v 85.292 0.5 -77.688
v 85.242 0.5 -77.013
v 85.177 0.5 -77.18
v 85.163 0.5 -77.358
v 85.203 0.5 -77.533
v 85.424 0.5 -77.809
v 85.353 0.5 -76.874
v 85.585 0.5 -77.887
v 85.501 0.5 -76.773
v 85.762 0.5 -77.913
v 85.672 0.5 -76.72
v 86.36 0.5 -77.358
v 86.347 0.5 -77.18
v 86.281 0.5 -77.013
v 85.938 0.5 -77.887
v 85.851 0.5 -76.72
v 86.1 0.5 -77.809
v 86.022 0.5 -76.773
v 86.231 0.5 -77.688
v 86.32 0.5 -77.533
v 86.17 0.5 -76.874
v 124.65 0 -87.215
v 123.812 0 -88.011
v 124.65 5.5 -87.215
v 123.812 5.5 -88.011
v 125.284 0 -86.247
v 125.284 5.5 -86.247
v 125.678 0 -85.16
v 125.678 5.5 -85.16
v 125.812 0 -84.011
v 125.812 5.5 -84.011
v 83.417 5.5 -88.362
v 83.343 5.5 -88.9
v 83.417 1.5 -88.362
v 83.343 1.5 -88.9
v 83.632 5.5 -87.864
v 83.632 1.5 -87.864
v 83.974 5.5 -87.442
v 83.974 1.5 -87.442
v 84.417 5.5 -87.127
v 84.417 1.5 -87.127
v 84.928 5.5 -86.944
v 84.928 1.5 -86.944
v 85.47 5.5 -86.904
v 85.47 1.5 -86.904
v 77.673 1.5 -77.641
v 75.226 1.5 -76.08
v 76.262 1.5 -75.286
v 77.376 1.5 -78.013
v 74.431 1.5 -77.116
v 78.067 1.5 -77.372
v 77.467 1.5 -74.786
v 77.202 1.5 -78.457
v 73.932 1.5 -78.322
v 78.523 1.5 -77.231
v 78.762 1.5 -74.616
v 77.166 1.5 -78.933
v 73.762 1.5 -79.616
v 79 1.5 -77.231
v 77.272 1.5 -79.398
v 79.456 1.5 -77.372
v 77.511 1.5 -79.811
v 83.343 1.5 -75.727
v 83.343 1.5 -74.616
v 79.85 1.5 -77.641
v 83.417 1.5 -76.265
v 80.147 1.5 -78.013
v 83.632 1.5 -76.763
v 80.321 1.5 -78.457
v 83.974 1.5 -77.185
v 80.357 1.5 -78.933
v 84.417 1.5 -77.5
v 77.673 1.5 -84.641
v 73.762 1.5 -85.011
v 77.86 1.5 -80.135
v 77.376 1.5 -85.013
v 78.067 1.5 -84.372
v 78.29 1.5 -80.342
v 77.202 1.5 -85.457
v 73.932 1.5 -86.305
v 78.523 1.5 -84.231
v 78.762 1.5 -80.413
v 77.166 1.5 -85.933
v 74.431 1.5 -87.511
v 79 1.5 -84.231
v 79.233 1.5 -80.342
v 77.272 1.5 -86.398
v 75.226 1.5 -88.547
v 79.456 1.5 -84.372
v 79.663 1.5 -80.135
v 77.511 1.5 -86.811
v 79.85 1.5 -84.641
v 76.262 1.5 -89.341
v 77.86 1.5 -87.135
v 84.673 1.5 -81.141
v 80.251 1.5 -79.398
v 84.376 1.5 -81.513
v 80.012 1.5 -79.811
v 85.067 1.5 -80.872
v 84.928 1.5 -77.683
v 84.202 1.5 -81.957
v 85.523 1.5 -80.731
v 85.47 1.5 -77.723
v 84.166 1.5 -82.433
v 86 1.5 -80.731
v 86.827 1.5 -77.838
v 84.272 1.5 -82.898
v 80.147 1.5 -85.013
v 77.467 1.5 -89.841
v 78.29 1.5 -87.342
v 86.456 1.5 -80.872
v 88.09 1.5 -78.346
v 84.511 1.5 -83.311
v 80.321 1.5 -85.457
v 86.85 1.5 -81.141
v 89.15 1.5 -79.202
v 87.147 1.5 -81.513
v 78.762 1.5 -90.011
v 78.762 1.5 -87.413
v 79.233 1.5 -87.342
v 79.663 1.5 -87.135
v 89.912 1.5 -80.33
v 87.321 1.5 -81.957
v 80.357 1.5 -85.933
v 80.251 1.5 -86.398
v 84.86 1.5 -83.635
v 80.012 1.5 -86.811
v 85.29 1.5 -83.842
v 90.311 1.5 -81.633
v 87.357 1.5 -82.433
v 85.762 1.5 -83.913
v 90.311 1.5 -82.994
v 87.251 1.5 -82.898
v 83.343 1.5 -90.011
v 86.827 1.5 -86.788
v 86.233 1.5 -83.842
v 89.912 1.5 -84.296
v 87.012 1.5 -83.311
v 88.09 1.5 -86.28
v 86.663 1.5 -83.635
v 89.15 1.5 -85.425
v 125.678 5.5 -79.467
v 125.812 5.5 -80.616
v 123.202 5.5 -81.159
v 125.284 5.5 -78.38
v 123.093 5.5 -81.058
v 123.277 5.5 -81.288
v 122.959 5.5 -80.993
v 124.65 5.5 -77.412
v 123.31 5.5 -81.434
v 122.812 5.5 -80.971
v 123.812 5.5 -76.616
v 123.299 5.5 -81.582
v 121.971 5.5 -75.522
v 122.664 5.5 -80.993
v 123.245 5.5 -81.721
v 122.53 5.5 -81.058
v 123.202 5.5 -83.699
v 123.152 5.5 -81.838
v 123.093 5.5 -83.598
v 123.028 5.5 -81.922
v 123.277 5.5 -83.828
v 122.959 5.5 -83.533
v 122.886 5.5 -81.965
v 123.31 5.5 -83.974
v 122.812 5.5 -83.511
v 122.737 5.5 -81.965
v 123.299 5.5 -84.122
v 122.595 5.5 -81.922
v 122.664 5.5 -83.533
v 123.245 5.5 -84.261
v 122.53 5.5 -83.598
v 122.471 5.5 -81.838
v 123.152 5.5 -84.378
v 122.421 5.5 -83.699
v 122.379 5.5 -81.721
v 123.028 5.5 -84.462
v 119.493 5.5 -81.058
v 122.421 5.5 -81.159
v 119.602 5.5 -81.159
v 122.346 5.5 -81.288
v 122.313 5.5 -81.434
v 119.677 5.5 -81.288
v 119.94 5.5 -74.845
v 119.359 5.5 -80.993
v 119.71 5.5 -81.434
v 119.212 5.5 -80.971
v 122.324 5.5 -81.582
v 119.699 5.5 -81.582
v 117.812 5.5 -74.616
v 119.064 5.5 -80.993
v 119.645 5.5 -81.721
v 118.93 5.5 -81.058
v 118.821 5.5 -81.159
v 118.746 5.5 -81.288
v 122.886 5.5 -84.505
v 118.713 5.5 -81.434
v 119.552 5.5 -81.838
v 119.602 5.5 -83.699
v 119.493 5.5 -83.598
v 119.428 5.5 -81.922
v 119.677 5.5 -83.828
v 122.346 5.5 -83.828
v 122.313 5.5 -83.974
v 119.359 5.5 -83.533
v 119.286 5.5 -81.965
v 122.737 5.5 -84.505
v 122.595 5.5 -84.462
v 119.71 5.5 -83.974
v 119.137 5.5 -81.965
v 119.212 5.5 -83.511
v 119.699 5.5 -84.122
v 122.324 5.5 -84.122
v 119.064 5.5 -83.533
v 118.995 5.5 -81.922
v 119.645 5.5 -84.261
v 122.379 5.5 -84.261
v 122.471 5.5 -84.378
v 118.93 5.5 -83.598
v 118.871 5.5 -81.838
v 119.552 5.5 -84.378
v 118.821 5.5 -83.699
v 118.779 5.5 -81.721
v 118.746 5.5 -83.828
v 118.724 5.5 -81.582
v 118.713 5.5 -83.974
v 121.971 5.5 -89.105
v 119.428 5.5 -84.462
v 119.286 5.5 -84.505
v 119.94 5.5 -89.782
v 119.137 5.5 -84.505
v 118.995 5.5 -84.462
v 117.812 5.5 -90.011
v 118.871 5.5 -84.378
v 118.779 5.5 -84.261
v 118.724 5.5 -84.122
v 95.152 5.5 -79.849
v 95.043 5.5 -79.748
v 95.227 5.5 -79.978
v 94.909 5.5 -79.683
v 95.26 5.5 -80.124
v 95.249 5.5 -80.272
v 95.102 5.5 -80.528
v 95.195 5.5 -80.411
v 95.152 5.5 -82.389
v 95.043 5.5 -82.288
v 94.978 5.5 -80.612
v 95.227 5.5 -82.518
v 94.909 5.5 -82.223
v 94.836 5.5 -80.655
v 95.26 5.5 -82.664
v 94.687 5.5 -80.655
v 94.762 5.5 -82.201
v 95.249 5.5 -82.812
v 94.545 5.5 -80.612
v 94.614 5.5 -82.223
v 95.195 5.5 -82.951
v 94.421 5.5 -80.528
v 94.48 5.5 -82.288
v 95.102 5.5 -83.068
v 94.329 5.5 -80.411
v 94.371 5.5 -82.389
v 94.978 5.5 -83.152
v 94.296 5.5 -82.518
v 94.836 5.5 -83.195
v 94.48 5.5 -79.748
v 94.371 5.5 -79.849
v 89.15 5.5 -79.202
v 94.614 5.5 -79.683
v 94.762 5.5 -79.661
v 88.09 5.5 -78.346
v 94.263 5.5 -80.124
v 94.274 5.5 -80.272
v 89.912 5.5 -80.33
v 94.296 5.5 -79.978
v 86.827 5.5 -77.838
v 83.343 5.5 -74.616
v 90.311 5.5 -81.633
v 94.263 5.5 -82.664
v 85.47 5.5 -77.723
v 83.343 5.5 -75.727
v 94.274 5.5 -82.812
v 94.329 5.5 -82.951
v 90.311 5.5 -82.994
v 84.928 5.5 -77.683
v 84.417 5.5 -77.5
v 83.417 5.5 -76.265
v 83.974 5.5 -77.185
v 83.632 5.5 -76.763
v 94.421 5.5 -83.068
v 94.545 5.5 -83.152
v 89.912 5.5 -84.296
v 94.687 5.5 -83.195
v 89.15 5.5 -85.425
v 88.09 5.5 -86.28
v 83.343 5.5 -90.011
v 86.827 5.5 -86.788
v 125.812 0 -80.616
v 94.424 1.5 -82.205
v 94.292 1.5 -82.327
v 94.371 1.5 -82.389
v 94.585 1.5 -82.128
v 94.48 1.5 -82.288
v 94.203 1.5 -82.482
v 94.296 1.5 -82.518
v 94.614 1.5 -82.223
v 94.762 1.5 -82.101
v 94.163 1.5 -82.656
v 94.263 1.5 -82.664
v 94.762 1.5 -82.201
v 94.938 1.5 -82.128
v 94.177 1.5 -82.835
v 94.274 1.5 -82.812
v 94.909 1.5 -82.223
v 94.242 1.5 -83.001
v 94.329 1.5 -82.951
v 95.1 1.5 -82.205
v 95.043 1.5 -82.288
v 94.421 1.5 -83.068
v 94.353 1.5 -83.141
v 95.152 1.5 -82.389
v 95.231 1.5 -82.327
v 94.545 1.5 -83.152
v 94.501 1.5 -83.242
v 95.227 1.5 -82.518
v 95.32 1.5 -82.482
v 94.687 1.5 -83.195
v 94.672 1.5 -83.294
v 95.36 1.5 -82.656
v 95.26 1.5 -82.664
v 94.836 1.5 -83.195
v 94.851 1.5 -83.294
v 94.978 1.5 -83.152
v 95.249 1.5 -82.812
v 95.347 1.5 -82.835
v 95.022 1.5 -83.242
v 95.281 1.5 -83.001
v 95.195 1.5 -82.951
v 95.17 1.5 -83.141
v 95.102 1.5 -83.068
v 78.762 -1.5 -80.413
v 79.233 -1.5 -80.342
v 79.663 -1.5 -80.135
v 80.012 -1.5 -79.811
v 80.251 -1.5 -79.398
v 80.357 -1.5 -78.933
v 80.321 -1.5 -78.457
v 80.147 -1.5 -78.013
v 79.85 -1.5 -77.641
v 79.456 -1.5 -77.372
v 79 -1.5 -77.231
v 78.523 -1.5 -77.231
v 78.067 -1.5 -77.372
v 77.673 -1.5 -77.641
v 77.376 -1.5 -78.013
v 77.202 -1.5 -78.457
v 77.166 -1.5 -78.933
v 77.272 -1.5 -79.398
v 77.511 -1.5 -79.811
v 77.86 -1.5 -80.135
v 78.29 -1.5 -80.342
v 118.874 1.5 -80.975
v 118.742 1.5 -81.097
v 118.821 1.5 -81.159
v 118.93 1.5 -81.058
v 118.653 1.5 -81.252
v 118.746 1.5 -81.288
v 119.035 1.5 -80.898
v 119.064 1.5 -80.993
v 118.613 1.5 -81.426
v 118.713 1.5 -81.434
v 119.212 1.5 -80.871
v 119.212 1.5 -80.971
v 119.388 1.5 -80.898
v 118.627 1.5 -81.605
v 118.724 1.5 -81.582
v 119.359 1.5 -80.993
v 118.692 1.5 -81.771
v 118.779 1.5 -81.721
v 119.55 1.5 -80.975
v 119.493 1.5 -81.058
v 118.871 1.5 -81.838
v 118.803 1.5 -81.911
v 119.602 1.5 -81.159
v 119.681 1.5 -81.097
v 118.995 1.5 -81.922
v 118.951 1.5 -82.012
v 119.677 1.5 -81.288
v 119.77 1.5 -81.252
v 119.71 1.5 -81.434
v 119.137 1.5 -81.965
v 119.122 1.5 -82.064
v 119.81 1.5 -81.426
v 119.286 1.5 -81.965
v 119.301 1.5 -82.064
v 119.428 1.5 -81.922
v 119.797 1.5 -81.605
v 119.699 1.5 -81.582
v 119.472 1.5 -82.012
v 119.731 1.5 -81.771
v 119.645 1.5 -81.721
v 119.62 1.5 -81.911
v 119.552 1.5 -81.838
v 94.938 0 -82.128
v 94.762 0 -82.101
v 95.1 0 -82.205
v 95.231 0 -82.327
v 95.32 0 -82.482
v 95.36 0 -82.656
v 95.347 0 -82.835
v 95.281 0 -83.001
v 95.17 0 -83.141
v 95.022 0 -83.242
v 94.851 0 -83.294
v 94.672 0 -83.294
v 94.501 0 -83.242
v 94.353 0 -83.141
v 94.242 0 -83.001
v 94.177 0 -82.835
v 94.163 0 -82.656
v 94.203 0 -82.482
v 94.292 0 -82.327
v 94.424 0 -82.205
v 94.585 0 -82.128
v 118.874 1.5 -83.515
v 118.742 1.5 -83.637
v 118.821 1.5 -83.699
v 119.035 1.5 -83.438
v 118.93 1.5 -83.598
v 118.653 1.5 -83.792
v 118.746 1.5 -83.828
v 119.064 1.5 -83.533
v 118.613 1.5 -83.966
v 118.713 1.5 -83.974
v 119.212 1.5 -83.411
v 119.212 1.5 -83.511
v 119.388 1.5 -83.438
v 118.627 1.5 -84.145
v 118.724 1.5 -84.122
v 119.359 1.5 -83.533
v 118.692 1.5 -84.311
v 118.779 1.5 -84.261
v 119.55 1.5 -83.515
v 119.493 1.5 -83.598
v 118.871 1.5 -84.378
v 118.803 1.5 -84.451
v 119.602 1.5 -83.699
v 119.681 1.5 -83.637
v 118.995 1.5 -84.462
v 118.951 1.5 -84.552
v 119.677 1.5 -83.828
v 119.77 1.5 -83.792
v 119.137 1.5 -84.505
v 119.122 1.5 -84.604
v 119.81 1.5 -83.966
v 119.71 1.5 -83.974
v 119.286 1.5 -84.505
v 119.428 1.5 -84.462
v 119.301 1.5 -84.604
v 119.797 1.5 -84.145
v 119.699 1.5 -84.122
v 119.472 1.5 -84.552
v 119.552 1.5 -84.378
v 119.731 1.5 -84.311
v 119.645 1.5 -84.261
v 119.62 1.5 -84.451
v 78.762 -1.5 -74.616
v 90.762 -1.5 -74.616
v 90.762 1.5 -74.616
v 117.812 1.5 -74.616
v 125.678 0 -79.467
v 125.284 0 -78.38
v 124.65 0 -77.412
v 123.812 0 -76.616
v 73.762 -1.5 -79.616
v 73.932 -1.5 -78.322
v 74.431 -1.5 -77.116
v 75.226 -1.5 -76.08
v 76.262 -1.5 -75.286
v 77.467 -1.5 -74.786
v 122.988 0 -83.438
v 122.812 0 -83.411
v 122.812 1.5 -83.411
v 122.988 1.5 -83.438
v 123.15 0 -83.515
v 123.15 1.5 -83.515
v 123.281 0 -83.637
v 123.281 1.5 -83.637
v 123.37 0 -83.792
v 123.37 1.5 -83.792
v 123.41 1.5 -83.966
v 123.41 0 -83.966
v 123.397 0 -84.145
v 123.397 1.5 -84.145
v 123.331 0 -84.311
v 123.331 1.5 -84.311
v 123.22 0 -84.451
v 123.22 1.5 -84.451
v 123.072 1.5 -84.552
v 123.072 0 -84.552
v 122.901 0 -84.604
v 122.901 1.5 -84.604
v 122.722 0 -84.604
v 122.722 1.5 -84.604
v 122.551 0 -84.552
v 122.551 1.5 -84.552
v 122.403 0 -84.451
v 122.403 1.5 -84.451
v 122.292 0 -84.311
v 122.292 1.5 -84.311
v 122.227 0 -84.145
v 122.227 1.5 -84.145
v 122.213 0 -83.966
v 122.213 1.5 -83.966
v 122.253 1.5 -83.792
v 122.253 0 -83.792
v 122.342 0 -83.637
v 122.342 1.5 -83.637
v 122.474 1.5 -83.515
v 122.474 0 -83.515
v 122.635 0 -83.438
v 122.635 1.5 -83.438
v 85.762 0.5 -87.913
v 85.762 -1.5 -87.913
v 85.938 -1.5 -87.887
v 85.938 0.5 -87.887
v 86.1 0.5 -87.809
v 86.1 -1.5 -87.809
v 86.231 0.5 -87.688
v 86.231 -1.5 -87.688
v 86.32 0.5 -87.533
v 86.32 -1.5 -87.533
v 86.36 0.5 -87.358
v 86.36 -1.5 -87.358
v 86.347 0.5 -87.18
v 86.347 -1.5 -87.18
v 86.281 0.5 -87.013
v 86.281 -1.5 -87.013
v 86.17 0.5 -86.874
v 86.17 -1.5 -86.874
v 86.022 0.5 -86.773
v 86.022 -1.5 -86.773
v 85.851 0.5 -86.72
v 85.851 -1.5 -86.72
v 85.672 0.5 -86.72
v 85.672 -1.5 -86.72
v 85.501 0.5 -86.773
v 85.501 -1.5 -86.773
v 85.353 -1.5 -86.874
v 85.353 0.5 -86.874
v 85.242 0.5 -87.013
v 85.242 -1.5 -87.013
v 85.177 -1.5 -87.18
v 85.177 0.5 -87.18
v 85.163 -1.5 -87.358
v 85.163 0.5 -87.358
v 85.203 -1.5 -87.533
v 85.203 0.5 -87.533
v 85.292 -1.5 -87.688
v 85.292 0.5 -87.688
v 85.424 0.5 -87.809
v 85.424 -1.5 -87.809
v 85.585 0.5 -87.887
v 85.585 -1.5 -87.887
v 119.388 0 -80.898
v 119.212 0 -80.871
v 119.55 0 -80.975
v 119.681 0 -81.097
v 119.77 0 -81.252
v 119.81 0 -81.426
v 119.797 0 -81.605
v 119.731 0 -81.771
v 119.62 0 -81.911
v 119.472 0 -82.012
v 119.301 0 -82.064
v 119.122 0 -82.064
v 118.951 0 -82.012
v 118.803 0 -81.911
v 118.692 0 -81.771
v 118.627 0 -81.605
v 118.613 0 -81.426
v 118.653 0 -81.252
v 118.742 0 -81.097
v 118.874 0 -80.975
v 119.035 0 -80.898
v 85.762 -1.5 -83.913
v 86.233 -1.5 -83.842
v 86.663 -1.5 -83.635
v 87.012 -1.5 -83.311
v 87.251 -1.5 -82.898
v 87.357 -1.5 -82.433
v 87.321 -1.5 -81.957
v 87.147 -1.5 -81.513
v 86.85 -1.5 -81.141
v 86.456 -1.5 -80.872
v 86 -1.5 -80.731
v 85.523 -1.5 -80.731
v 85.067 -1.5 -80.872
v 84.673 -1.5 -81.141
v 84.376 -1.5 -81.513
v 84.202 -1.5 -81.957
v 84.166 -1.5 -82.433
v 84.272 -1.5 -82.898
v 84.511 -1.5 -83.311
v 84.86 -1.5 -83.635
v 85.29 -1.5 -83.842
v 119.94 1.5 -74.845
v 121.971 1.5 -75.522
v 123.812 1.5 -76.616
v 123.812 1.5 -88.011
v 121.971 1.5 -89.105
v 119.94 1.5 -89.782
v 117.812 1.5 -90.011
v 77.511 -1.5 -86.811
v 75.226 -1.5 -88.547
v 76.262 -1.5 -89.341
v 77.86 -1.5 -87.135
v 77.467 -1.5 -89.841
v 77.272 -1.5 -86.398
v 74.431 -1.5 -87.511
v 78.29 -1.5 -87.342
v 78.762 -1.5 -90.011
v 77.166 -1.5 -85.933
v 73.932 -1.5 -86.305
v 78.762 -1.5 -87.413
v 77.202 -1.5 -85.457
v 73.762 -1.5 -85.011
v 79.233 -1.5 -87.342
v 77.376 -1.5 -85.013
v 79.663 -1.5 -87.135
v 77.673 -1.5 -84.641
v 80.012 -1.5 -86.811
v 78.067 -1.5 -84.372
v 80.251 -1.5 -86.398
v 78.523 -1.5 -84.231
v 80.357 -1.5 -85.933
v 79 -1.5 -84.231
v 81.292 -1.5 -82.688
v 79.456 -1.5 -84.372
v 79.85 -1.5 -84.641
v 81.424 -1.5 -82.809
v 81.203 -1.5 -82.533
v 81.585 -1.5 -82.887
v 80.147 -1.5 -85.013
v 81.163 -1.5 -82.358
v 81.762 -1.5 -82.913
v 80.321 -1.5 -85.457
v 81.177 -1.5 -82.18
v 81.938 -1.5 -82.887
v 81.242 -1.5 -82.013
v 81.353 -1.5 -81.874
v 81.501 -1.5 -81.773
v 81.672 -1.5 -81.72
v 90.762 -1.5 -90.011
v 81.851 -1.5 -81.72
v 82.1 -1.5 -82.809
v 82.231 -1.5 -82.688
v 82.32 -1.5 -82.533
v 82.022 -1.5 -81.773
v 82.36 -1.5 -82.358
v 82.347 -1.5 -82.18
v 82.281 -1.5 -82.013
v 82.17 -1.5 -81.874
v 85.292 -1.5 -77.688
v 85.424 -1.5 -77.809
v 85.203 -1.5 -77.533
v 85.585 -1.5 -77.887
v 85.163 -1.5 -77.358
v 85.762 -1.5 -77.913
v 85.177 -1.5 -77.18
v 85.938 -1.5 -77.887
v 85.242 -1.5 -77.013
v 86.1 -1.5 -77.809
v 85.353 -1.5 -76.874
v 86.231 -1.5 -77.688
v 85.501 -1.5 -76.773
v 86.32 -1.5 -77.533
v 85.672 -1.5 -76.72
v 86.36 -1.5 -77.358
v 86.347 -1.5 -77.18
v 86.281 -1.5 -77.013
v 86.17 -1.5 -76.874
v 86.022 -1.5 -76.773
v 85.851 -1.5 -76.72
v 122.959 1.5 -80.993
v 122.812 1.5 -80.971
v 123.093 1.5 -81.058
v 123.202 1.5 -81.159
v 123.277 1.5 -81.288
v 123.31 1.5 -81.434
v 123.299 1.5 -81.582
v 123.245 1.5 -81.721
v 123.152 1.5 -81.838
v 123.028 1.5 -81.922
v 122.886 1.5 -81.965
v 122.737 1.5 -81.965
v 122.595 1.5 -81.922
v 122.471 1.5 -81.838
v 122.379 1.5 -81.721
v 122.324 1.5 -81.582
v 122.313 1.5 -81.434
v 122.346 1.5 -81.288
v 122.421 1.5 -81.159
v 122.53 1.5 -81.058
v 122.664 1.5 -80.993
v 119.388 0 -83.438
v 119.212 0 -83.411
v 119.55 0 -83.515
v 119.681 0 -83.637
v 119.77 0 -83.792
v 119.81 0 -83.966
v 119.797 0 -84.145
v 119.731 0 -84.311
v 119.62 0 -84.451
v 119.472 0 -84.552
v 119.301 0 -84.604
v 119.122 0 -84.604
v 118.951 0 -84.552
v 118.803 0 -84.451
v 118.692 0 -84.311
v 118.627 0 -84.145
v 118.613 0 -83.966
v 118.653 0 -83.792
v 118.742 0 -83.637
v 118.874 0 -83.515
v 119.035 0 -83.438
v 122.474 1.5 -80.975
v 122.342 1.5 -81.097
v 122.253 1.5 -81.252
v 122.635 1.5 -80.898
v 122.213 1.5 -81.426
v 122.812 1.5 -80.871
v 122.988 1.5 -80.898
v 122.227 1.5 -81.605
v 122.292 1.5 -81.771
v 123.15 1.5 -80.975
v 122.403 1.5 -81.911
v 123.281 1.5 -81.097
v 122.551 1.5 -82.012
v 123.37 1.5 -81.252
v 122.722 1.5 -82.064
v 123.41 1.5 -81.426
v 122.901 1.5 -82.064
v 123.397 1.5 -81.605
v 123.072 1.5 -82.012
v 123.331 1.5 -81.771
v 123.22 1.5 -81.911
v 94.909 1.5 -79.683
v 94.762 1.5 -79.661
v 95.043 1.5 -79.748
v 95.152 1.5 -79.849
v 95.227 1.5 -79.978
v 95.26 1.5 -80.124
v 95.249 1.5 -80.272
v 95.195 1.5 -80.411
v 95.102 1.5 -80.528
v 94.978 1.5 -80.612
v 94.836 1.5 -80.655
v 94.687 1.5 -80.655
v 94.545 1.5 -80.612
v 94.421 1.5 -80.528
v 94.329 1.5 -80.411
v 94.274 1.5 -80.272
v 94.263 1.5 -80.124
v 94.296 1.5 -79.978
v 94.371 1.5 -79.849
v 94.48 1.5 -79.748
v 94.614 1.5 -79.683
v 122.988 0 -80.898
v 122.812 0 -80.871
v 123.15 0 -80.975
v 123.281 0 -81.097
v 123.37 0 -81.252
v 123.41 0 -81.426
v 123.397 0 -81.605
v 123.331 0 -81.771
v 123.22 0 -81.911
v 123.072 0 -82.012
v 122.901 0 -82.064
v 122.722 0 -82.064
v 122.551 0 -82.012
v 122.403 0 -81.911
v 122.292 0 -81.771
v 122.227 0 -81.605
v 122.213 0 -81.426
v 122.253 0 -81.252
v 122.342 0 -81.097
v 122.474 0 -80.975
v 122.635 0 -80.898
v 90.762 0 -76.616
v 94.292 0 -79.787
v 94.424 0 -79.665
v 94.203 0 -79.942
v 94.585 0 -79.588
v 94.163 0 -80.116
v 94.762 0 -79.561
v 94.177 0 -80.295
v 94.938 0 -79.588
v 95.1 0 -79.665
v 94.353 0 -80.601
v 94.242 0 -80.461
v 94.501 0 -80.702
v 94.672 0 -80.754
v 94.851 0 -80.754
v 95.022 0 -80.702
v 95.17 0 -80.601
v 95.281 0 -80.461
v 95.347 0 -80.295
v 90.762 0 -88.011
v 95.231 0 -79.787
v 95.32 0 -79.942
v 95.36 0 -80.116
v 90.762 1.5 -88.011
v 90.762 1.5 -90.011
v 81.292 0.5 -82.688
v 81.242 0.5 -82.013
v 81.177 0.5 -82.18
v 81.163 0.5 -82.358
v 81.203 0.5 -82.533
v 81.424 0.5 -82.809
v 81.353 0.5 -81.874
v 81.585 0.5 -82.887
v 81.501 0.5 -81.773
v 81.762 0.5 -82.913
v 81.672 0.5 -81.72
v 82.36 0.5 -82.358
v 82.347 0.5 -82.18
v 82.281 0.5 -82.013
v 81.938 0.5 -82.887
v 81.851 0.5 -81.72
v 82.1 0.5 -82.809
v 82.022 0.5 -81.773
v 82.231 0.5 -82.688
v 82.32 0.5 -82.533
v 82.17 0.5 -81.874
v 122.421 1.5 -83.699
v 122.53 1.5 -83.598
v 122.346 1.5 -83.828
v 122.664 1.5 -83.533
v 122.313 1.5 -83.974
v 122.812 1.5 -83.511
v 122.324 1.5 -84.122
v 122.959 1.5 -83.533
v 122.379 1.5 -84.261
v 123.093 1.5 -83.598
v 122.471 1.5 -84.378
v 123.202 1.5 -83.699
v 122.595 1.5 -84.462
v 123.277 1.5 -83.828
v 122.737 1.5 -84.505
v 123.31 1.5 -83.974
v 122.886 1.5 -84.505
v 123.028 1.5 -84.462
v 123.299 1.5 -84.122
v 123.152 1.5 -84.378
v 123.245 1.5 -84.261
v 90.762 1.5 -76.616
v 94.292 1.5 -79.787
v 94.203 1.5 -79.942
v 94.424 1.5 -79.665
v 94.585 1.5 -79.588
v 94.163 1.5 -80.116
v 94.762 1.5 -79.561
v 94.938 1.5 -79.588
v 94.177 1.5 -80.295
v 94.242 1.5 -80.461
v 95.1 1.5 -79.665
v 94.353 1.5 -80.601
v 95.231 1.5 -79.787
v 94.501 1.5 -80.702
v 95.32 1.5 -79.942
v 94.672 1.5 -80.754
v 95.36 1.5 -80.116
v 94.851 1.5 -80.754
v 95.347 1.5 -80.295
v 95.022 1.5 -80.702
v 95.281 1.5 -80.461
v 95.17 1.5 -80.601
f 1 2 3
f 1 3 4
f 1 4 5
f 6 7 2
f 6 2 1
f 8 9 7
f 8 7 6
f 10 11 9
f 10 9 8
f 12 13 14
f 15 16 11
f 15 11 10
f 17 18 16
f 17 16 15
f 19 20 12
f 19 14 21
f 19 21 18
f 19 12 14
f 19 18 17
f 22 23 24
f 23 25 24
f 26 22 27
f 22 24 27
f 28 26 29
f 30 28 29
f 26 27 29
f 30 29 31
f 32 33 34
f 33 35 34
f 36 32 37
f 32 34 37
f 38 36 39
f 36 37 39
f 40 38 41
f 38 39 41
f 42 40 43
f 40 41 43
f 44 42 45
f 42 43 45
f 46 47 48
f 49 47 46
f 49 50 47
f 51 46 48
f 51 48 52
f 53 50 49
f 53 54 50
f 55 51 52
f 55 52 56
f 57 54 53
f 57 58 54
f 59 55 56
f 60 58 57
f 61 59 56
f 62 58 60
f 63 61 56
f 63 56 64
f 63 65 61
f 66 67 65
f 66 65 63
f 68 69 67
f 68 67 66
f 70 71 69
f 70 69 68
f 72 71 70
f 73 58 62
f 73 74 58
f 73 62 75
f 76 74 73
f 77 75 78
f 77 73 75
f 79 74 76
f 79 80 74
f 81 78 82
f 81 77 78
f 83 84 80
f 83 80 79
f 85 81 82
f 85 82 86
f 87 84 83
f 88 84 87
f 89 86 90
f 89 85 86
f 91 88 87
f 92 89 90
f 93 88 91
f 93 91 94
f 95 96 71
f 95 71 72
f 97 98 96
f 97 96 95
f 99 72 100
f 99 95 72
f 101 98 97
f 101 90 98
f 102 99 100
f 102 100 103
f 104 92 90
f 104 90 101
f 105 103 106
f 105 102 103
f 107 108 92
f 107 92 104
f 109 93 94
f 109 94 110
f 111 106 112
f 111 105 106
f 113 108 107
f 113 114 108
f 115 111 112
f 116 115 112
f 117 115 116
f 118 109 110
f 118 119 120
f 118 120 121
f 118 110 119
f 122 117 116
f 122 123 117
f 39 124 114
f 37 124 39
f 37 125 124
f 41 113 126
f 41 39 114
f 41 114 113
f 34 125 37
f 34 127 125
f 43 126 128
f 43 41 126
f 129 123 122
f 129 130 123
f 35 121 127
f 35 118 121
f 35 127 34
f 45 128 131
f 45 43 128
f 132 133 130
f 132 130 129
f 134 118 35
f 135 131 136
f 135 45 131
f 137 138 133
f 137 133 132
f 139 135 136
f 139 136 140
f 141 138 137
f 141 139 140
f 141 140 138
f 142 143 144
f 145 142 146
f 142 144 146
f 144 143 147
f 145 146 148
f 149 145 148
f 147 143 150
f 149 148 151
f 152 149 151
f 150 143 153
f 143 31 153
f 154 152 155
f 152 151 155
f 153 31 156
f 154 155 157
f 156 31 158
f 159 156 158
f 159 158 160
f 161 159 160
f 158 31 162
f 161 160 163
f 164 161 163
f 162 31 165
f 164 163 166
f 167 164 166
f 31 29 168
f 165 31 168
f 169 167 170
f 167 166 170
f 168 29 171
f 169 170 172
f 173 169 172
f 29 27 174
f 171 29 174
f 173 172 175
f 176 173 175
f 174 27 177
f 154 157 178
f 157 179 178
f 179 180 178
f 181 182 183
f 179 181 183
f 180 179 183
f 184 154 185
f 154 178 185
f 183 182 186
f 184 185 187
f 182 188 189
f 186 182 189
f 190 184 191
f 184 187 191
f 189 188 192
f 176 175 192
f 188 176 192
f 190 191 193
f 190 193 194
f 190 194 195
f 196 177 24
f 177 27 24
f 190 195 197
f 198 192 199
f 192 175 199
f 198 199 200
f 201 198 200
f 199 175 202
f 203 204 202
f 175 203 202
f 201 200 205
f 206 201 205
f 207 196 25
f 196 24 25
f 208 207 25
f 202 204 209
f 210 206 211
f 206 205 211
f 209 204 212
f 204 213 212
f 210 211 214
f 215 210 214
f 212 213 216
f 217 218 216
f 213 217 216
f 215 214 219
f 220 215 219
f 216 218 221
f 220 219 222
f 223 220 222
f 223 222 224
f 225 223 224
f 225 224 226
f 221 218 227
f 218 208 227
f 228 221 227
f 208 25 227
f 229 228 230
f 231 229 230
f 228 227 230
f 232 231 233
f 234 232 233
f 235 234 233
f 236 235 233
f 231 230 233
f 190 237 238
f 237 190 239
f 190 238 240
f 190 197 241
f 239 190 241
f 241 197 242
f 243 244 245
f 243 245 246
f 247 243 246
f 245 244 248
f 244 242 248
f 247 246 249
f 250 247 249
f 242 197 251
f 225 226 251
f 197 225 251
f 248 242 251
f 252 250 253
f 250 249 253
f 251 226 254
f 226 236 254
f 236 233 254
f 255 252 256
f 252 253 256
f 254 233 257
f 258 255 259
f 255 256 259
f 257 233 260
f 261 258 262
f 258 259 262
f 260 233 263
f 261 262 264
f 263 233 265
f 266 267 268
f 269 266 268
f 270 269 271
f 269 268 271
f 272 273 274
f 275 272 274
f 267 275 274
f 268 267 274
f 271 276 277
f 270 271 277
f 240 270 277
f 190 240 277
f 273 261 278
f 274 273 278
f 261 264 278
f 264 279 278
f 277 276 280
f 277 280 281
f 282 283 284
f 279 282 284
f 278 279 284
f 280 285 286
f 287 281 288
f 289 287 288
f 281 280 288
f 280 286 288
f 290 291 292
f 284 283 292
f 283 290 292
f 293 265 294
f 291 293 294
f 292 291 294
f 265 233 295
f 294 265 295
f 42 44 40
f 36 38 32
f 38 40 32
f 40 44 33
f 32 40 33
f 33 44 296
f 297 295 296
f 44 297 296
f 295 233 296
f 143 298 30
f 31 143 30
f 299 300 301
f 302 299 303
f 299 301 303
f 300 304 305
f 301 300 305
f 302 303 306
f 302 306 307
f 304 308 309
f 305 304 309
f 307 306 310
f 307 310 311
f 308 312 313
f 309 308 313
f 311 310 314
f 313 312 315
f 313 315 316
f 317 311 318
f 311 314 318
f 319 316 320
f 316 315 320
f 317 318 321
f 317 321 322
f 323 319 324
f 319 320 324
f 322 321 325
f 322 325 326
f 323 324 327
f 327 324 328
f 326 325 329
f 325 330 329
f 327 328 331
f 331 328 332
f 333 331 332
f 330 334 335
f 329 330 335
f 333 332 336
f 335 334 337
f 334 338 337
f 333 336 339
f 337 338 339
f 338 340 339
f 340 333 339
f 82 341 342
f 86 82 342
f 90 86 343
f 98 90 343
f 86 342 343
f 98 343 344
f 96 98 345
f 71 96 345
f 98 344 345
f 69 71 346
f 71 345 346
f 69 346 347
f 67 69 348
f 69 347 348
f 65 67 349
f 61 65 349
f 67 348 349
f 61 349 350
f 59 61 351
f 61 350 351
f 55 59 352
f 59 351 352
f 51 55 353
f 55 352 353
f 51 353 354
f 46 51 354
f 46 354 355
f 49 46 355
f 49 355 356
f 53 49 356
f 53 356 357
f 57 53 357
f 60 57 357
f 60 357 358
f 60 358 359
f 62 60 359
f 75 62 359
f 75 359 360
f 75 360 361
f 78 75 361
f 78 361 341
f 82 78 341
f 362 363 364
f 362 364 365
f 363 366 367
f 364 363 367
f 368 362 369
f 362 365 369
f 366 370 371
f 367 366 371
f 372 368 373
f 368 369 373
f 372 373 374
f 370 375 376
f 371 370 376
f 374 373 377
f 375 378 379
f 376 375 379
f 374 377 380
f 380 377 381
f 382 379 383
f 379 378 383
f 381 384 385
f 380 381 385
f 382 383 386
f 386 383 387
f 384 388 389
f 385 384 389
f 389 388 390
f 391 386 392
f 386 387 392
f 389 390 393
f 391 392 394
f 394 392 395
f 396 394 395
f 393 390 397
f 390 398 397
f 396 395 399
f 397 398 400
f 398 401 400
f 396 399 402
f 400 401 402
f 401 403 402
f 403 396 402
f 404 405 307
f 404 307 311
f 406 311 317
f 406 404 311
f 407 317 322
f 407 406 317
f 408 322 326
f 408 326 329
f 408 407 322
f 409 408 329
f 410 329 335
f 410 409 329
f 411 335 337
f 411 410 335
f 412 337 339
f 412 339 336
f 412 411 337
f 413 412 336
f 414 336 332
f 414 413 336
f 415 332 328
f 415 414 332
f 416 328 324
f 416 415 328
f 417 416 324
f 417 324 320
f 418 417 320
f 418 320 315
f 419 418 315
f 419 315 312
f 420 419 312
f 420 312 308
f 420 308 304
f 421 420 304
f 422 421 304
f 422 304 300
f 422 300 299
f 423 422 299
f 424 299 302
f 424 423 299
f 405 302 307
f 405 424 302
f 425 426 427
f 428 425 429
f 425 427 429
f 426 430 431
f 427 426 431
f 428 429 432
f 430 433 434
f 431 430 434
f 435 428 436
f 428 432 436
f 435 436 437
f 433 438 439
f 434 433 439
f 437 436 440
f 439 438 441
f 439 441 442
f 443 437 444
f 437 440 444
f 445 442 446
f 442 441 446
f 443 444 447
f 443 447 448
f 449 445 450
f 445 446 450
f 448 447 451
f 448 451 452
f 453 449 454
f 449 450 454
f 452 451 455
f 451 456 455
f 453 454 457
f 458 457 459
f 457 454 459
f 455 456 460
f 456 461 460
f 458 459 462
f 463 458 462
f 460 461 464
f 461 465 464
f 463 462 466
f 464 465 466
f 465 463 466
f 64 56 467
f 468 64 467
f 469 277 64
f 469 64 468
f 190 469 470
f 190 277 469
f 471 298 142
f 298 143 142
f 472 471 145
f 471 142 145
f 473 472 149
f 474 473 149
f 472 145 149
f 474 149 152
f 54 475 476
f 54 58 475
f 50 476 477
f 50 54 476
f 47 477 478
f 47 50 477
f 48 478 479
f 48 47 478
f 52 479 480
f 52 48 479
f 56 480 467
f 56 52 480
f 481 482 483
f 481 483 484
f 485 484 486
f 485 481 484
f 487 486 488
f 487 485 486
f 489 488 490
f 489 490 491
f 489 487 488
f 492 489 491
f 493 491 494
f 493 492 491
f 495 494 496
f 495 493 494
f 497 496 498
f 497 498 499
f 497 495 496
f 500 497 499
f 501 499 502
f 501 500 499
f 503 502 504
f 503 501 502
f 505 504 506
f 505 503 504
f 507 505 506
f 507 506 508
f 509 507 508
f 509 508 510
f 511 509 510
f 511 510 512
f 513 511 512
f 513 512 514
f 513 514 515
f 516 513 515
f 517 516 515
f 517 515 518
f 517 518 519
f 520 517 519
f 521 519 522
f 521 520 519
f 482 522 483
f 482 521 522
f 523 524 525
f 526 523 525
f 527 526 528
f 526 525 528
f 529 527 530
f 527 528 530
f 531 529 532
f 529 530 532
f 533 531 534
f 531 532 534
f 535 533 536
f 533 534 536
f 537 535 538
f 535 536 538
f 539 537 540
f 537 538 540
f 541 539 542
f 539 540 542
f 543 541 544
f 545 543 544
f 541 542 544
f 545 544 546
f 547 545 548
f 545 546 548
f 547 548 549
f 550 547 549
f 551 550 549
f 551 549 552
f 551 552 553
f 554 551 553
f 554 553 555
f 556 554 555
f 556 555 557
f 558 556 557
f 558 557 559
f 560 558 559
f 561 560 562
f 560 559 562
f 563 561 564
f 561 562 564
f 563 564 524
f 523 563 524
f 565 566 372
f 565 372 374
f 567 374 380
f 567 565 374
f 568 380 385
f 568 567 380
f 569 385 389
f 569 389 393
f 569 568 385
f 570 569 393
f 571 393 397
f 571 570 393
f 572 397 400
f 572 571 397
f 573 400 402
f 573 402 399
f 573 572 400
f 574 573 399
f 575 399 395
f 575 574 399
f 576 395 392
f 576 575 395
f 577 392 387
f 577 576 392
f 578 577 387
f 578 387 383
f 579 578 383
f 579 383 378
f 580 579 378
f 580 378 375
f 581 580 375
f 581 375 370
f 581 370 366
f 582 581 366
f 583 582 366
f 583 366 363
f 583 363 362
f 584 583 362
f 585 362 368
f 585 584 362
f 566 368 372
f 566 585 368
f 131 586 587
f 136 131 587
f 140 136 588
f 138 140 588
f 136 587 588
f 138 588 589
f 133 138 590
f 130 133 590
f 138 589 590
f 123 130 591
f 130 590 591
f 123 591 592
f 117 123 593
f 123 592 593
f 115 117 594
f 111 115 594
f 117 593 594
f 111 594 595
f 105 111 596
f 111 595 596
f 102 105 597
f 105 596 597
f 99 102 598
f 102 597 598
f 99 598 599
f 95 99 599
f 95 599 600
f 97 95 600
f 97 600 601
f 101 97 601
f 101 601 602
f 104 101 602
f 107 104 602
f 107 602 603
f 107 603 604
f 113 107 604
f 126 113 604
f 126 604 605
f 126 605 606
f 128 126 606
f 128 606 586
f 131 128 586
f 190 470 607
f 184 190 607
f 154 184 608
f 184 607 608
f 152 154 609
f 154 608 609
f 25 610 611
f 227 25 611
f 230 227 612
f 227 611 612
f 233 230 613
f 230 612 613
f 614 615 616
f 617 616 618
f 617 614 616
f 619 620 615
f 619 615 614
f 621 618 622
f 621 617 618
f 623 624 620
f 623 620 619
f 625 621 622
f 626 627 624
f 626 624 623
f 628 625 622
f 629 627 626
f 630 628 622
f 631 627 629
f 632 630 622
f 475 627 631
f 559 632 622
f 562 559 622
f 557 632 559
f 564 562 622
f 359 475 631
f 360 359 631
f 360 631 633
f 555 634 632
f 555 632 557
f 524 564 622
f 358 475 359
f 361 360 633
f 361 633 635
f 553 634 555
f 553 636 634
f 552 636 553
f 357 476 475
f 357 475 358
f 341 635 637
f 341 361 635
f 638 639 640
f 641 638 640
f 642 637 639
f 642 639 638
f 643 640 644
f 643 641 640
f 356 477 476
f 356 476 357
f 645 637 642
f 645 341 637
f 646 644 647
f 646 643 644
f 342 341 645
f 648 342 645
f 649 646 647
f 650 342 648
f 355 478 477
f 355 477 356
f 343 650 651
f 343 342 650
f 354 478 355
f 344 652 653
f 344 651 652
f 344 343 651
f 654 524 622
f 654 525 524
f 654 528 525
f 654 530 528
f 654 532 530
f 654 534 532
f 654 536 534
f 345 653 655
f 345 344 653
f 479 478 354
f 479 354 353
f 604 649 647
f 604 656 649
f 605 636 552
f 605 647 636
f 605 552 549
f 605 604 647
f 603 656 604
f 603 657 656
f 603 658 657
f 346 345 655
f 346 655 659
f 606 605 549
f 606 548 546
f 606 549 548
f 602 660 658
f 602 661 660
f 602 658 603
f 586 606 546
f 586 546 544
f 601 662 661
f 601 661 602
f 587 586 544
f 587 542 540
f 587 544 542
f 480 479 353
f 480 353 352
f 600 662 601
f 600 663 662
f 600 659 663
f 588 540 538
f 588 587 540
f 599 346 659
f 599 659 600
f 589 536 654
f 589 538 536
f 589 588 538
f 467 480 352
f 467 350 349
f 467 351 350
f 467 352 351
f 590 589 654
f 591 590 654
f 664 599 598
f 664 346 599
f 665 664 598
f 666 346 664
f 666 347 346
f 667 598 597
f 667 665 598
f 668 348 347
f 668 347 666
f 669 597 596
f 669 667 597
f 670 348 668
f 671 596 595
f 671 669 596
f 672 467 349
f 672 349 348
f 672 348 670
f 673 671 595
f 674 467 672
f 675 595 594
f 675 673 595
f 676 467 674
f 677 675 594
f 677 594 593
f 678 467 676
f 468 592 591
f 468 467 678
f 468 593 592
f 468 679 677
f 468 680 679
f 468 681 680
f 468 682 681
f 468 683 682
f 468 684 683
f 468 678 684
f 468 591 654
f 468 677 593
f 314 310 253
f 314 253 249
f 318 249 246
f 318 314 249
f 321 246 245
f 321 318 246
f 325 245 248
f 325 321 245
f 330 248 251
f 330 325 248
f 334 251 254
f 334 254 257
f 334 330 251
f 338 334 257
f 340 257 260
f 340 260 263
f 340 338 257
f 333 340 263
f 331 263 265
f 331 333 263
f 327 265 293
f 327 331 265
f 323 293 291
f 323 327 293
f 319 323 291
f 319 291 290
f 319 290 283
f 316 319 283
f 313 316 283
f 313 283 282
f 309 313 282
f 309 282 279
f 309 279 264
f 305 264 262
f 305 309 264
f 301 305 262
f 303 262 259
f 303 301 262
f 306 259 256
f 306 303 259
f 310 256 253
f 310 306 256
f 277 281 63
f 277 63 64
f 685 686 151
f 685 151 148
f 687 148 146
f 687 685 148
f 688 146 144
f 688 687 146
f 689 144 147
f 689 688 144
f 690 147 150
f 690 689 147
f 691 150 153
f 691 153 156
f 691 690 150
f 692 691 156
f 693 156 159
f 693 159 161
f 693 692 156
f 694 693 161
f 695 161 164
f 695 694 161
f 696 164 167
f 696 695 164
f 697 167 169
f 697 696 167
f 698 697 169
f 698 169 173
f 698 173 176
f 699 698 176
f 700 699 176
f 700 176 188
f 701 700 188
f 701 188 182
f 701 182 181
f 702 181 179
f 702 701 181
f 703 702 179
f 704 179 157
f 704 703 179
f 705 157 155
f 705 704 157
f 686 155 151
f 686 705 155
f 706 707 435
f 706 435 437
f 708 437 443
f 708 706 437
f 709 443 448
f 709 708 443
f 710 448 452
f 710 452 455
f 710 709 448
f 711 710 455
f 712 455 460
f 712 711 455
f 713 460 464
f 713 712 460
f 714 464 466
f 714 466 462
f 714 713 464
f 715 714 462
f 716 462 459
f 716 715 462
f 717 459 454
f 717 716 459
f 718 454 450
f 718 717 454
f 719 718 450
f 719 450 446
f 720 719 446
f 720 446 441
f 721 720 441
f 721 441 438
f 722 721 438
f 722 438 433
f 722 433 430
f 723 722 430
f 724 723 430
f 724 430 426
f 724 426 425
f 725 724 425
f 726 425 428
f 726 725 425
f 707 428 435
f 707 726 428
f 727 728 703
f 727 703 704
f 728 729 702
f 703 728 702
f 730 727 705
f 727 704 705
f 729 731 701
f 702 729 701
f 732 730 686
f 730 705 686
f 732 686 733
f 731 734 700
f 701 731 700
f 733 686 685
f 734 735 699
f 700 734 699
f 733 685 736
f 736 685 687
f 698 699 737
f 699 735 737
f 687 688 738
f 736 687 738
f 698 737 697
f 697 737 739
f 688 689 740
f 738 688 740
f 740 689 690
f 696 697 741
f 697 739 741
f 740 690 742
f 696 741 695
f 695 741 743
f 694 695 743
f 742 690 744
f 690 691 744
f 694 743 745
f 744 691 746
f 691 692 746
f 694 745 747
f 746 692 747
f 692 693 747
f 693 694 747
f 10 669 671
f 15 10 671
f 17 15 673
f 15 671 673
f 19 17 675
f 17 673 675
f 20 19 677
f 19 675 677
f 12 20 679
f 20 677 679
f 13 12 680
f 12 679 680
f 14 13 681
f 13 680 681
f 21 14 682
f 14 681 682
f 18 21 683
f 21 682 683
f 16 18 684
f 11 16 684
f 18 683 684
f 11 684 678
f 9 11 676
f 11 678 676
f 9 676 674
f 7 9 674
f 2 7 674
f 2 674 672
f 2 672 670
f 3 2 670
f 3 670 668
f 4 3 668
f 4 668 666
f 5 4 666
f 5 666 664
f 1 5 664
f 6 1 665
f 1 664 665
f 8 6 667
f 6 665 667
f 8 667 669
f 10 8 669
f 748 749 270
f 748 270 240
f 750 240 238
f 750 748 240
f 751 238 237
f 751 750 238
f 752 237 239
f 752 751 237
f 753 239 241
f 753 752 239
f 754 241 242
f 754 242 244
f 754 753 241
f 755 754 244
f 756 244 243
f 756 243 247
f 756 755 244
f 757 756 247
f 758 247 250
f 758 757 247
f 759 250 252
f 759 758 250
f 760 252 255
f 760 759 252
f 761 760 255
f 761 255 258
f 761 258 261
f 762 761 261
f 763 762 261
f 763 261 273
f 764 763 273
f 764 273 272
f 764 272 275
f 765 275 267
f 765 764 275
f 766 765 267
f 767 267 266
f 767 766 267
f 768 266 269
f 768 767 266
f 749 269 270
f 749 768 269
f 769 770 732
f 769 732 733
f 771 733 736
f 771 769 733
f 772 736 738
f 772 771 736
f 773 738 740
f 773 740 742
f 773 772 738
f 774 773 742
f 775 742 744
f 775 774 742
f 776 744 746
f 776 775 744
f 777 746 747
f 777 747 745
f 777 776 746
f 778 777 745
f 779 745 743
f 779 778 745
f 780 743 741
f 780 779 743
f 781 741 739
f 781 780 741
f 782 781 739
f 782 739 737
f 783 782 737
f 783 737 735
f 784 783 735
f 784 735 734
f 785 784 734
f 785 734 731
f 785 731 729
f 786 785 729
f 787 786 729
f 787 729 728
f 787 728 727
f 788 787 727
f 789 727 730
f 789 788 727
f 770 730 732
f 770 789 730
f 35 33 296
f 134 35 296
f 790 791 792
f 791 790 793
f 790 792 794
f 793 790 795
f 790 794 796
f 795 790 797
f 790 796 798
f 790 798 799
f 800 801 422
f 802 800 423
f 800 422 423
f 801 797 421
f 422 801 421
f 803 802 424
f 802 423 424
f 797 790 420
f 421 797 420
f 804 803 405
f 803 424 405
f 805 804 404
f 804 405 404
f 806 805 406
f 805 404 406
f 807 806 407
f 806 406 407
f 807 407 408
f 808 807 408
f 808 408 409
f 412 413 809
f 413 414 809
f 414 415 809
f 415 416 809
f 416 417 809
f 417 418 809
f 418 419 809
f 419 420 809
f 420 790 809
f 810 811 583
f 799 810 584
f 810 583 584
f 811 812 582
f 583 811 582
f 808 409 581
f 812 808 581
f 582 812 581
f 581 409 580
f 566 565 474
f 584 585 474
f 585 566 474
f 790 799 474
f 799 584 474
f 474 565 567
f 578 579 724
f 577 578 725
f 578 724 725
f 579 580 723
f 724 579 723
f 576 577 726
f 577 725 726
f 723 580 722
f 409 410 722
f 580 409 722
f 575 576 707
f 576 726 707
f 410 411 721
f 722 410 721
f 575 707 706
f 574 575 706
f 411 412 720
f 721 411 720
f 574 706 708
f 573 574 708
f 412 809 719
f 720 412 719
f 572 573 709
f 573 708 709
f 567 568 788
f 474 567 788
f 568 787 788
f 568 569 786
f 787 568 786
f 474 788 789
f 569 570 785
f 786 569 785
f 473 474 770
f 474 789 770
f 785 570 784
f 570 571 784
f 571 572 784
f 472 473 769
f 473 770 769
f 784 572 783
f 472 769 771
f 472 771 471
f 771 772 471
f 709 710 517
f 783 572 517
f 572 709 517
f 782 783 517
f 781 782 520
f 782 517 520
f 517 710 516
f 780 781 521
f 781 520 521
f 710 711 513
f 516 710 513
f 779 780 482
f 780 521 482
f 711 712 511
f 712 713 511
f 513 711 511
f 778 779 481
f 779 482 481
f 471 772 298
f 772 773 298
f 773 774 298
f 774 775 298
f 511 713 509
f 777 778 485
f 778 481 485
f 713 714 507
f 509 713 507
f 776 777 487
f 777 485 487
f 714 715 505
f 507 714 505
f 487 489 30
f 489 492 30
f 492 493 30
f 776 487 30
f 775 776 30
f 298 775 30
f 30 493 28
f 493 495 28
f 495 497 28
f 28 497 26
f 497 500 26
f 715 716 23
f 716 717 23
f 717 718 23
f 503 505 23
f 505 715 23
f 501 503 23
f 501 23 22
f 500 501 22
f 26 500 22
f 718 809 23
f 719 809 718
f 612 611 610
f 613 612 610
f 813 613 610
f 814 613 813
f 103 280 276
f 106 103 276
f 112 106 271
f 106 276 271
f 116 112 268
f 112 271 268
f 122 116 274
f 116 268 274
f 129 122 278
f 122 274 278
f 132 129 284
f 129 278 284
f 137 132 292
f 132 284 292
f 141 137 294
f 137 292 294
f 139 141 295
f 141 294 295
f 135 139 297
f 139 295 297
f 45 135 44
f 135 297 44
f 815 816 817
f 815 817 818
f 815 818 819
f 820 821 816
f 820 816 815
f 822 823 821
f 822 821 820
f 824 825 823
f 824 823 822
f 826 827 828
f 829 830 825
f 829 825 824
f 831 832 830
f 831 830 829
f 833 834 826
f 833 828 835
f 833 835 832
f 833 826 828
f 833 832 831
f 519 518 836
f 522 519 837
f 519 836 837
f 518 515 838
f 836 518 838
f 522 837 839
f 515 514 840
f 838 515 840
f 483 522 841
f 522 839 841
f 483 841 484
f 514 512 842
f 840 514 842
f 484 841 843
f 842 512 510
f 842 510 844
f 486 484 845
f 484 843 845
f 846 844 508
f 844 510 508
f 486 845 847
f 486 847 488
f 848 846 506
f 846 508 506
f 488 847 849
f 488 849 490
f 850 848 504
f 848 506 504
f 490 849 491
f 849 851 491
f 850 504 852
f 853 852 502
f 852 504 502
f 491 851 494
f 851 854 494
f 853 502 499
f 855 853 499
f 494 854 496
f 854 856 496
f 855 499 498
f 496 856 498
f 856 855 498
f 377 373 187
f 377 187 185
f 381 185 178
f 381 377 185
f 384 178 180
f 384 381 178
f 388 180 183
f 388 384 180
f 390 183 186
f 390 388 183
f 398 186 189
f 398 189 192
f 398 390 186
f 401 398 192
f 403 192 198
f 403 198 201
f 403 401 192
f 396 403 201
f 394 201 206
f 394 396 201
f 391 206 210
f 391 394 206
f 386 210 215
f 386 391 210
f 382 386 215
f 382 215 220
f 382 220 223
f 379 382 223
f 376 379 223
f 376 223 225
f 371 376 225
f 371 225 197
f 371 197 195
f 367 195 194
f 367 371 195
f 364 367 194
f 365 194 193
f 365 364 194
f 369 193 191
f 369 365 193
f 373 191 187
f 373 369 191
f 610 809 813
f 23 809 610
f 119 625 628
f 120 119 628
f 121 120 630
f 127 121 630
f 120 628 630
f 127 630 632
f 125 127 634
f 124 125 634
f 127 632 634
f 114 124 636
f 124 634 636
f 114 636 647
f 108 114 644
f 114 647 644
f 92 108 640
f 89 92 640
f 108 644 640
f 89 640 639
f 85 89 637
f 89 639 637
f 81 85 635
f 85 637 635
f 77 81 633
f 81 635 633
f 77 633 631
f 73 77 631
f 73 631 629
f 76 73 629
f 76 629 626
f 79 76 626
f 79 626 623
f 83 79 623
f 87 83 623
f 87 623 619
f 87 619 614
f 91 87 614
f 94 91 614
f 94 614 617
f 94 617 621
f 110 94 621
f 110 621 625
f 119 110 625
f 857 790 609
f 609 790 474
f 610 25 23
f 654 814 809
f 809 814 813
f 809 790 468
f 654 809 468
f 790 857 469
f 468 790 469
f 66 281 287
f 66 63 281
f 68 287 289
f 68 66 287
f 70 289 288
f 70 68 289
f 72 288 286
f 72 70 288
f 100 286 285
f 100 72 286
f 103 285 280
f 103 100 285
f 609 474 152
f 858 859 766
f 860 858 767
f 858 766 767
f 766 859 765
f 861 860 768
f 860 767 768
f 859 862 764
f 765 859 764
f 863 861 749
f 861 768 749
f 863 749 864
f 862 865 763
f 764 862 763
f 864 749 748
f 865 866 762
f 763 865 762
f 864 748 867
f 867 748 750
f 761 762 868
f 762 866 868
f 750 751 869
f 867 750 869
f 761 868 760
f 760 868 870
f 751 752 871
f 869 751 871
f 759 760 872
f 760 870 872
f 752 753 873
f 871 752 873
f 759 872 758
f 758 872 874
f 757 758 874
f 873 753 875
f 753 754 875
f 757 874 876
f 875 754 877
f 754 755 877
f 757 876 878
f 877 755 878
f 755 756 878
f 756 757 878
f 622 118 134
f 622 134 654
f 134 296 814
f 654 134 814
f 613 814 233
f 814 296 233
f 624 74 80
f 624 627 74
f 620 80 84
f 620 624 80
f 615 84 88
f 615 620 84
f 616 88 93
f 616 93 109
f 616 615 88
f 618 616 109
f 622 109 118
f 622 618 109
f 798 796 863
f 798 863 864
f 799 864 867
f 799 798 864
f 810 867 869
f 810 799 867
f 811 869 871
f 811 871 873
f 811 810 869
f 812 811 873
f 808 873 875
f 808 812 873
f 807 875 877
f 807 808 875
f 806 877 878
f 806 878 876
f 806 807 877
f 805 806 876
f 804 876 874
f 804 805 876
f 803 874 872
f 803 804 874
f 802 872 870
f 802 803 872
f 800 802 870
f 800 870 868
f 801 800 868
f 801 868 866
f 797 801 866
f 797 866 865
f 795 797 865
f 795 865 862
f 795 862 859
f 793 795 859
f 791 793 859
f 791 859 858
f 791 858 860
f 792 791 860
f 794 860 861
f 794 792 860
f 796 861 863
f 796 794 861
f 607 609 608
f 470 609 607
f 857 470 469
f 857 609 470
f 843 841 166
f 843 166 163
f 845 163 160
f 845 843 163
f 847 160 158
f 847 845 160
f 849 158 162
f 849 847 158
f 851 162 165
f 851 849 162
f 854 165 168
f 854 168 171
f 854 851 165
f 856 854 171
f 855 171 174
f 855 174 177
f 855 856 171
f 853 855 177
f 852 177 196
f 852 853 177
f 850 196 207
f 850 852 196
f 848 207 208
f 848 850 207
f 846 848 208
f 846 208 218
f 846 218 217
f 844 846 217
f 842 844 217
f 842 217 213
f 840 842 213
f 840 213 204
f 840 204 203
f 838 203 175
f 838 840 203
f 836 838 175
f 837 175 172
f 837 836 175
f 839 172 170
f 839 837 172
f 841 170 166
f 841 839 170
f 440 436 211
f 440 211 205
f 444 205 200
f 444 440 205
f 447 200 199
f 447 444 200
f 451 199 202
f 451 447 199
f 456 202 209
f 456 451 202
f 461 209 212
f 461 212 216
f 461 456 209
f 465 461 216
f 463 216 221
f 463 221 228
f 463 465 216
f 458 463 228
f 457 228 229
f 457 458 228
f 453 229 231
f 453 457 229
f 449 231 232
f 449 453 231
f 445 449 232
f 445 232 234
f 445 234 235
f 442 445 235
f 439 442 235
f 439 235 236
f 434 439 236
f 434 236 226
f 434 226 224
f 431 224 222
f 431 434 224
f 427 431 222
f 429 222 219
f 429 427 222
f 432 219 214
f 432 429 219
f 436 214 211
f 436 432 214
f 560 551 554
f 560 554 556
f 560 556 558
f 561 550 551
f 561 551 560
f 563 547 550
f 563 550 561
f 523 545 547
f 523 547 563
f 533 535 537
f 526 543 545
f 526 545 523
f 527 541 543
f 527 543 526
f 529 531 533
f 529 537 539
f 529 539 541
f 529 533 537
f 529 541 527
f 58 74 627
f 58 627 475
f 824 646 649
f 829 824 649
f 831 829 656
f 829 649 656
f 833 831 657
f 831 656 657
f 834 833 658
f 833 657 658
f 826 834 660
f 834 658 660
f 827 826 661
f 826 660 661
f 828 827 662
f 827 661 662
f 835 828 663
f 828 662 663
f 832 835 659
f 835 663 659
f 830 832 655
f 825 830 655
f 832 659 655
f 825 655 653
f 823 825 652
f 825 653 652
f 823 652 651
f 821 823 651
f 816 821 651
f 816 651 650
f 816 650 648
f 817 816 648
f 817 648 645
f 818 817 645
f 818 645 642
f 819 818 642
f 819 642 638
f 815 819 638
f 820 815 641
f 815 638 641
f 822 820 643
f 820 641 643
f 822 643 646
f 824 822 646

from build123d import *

# Parameters (mm, degrees)
SKETCH_2_W          = 35.05
SKETCH_2_H          = 11.3952
SKETCH_2_R          = 0.6
EXTRUDE_1_DEPTH     = 1.5
SKETCH_3_W          = 39.05
SKETCH_3_H          = 15.3952
SKETCH_3_R          = 0.5
EXTRUDE_2_DEPTH     = 4
SKETCH_4_W          = 15
SKETCH_4_H          = 4
EXTRUDE_3_DEPTH     = 15.3952
SKETCH_5_W          = 17
SKETCH_5_H          = 15.3952
EXTRUDE_4_DEPTH     = 3
SKETCH_6_R          = 1.6
CUT_EXTRUDE_1_DEPTH = 157.48252797
CUT_EXTRUDE_2_DEPTH = 4
CUT_EXTRUDE_4_DEPTH = 4
FILLET_2_R          = 5
CUT_EXTRUDE_5_DEPTH = 4
FILLET_3_R          = 2
SKETCH_10_R         = 0.6
CUT_EXTRUDE_6_DEPTH = 2
CUT_EXTRUDE_7_DEPTH = 157.422605654
CUT_EXTRUDE_8_DEPTH = 156.918332452
FILLET_5_R          = 5


with BuildPart() as part:
    # 草图2 → 凸台-拉伸1 (new body)
    with BuildSketch(Plane(origin=(0, 0, 0), x_dir=(1, 0, 0), z_dir=(0, 1, 0))):
        with Locations((108.28655231, 82.313447411)):
            Rectangle(SKETCH_2_W, SKETCH_2_H)
        with Locations(Location((94.76155231, 82.701047411, 0), (0, 0, 270))):
            Circle(SKETCH_2_R, mode=Mode.SUBTRACT)
        with Locations(Location((94.76155231, 80.161047411, 0), (0, 0, 270))):
            Circle(SKETCH_2_R, mode=Mode.SUBTRACT)
        with Locations(Location((119.21155231, 84.011047411, 0), (0, 0, 270))):
            Circle(SKETCH_2_R, mode=Mode.SUBTRACT)
        with Locations(Location((122.81155231, 84.011047411, 0), (0, 0, 270))):
            Circle(SKETCH_2_R, mode=Mode.SUBTRACT)
        with Locations(Location((122.81155231, 81.471047411, 0), (0, 0, 270))):
            Circle(SKETCH_2_R, mode=Mode.SUBTRACT)
        with Locations(Location((119.21155231, 81.471047411, 0), (0, 0, 270))):
            Circle(SKETCH_2_R, mode=Mode.SUBTRACT)
    extrude(amount=EXTRUDE_1_DEPTH)

    # 草图3 → 凸台-拉伸2 (add)
    with BuildSketch(Plane(origin=(0, 1.5, 0), x_dir=(1, 0, 0), z_dir=(0, 1, 0))):
        with Locations((108.28655231, 82.313447411)):
            Rectangle(SKETCH_3_W, SKETCH_3_H)
        with Locations(Location((94.76155231, 82.701047411, 0), (0, 0, 270))):
            Circle(SKETCH_3_R, mode=Mode.SUBTRACT)
        with Locations(Location((94.76155231, 80.161047411, 0), (0, 0, 270))):
            Circle(SKETCH_3_R, mode=Mode.SUBTRACT)
        with Locations(Location((119.21155231, 84.011047411, 0), (0, 0, 270))):
            Circle(SKETCH_3_R, mode=Mode.SUBTRACT)
        with Locations(Location((122.81155231, 84.011047411, 0), (0, 0, 270))):
            Circle(SKETCH_3_R, mode=Mode.SUBTRACT)
        with Locations(Location((122.81155231, 81.471047411, 0), (0, 0, 270))):
            Circle(SKETCH_3_R, mode=Mode.SUBTRACT)
        with Locations(Location((119.21155231, 81.471047411, 0), (0, 0, 270))):
            Circle(SKETCH_3_R, mode=Mode.SUBTRACT)
    extrude(amount=EXTRUDE_2_DEPTH)

    # 草图4 → 凸台-拉伸3 (add)
    with BuildSketch(Plane(origin=(0, 0, -90.011047411), x_dir=(-1, 0, 0), z_dir=(0, 0, -1))):
        with Locations((-81.26155231, 3.5)):
            Rectangle(SKETCH_4_W, SKETCH_4_H)
    extrude(amount=-EXTRUDE_3_DEPTH)

    # 草图5 → 凸台-拉伸4 (add)
    with BuildSketch(Plane.XZ.offset(-1.5)):
        with Locations((82.26155231, -82.313447411)):
            Rectangle(SKETCH_5_W, SKETCH_5_H)
    extrude(amount=EXTRUDE_4_DEPTH)

    # 草图6 → 切除-拉伸1 (cut, through all)
    with BuildSketch(Plane.XZ.offset(1.5)):
        with Locations(Location((78.76155231, -78.813447411, 0), (0, 0, 270))):
            Circle(SKETCH_6_R)
        with Locations(Location((85.76155231, -82.313447411, 0), (0, 0, 270))):
            Circle(SKETCH_6_R)
        with Locations(Location((78.76155231, -85.813447411, 0), (0, 0, 270))):
            Circle(SKETCH_6_R)
    extrude(amount=-CUT_EXTRUDE_1_DEPTH, mode=Mode.SUBTRACT)

    # 草图7 → 切除-拉伸2 (cut)
    with BuildSketch(Plane(origin=(0, 5.5, 0), x_dir=(1, 0, 0), z_dir=(0, 1, 0))):
        with BuildLine():
            ThreePointArc((83.342986542, 86.226315876), (76.648541293, 89.899421523), (75.776589998, 82.313447411))
            ThreePointArc((75.776589998, 82.313447411), (76.648541293, 74.727473299), (83.342986542, 78.400578945))
            ThreePointArc((83.342986542, 78.400578945), (90.36155231, 82.313447411), (83.342986542, 86.226315876))
        make_face()
    extrude(amount=-CUT_EXTRUDE_2_DEPTH, mode=Mode.SUBTRACT)

    # 草图8 → 切除-拉伸4 (cut)
    with BuildSketch(Plane(origin=(0, 5.5, 0), x_dir=(1, 0, 0), z_dir=(0, 1, 0))):
        with BuildLine():
            Line((76.880022549, 90.011047411), (73.76155231, 90.011047411))
            Line((73.76155231, 90.011047411), (73.76155231, 74.615847411))
            Line((73.76155231, 74.615847411), (76.880022549, 74.615847411))
            ThreePointArc((76.880022549, 74.615847411), (74.208097828, 78.160720601), (75.776589998, 82.313447411))
            ThreePointArc((75.776589998, 82.313447411), (74.208097828, 86.466174221), (76.880022549, 90.011047411))
        make_face()
    extrude(amount=-CUT_EXTRUDE_4_DEPTH, mode=Mode.SUBTRACT)

    # 圆角2
    fillet_2_edges = [part.edges().sort_by_distance(p)[0] for p in [
        (73.76155231, 0, -74.615847411),
        (73.76155231, 0, -90.011047411),
    ]]
    fillet(fillet_2_edges, radius=FILLET_2_R)

    # 草图9 → 切除-拉伸5 (cut)
    with BuildSketch(Plane(origin=(0, 5.5, 0), x_dir=(1, 0, 0), z_dir=(0, 1, 0))):
        Polygon((83.342986542, 86.226315876), (83.342986542, 90.011047411), (80.64308207, 90.011047411), align=None)
        Polygon((83.342986542, 78.400578945), (83.342986542, 74.615847411), (80.64308207, 74.615847411), align=None)
    extrude(amount=-CUT_EXTRUDE_5_DEPTH, mode=Mode.SUBTRACT)

    # 圆角3
    fillet_3_edges = [part.edges().sort_by_distance(p)[0] for p in [
        (83.342986542, 3.5, -78.400578945),
        (83.342986542, 3.5, -86.226315876),
    ]]
    fillet(fillet_3_edges, radius=FILLET_3_R)

    # 草图10 → 切除-拉伸6 (cut)
    with BuildSketch(Plane.XZ.offset(1.5)):
        with Locations(Location((81.76155231, -82.313447411, 0), (0, 0, 270))):
            Circle(SKETCH_10_R)
        with Locations(Location((85.76155231, -77.313447411, 0), (0, 0, 270))):
            Circle(SKETCH_10_R)
        with Locations(Location((85.76155231, -87.313447411, 0), (0, 0, 270))):
            Circle(SKETCH_10_R)
    extrude(amount=-CUT_EXTRUDE_6_DEPTH, mode=Mode.SUBTRACT)

    # 草图11 → 切除-拉伸7 (cut, through all)
    with BuildSketch(Plane.XZ):
        with BuildLine():
            Line((127.81155231, -74.615847411), (117.81155231, -74.615847411))
            ThreePointArc((117.81155231, -74.615847411), (120.97382997, -75.12901443), (123.811552309, -76.615847411))
            Line((123.811552309, -76.615847411), (125.81155231, -76.615847411))
            Line((125.81155231, -76.615847411), (125.81155231, -78.615847411))
            ThreePointArc((125.811552309, -78.615847411), (126.278688967, -79.295359009), (126.688253102, -80.011047411))
            ThreePointArc((126.688253102, -80.011047411), (127.249902706, -82.313447411), (126.688253102, -84.615847411))
            ThreePointArc((126.688253102, -84.615847411), (126.278688967, -85.331535812), (125.811552309, -86.011047411))
            Line((125.81155231, -86.011047411), (125.81155231, -88.011047411))
            Line((125.81155231, -88.011047411), (123.811552309, -88.011047411))
            ThreePointArc((123.811552309, -88.011047411), (120.97382997, -89.497880391), (117.81155231, -90.011047411))
            Line((117.81155231, -90.011047411), (127.81155231, -90.011047411))
            Line((127.81155231, -90.011047411), (127.811552309, -84.615847411))
            Line((127.811552309, -84.615847411), (127.811552309, -80.011047411))
            Line((127.811552309, -80.011047411), (127.81155231, -74.615847411))
        make_face()
        with BuildLine():
            Line((125.81155231, -76.615847411), (123.811552309, -76.615847411))
            ThreePointArc((123.811552309, -76.615847411), (124.882620121, -77.544779599), (125.811552309, -78.615847411))
            Line((125.81155231, -78.615847411), (125.81155231, -76.615847411))
        make_face()
        with BuildLine():
            Line((125.81155231, -88.011047411), (125.81155231, -86.011047411))
            ThreePointArc((125.811552309, -86.011047411), (124.882620121, -87.082115223), (123.811552309, -88.011047411))
            Line((123.811552309, -88.011047411), (125.81155231, -88.011047411))
        make_face()
    extrude(amount=-CUT_EXTRUDE_7_DEPTH, mode=Mode.SUBTRACT)

    # 草图12 → 切除-拉伸8 (cut, through all)
    with BuildSketch(Plane.XZ.offset(-1.5)):
        with BuildLine():
            Line((125.81155231, -78.615847411), (125.81155231, -86.011047411))
            ThreePointArc((125.81155231, -86.011047411), (126.278688967, -85.331535812), (126.688253102, -84.615847411))
            ThreePointArc((126.688253102, -84.615847411), (127.249902706, -82.313447411), (126.688253102, -80.011047411))
            ThreePointArc((126.688253102, -80.011047411), (126.278688967, -79.295359009), (125.81155231, -78.615847411))
        make_face()
    extrude(amount=-CUT_EXTRUDE_8_DEPTH, mode=Mode.SUBTRACT)

    # 圆角5
    fillet_5_edges = [part.edges().sort_by_distance(p)[0] for p in [
        (125.811552309, 2.75, -86.011047411),
        (125.811552309, 2.75, -78.615847411),
    ]]
    fillet(fillet_5_edges, radius=FILLET_5_R - 0.0001)  # a hair under: the kernel refuses the full size


solid = part.part
